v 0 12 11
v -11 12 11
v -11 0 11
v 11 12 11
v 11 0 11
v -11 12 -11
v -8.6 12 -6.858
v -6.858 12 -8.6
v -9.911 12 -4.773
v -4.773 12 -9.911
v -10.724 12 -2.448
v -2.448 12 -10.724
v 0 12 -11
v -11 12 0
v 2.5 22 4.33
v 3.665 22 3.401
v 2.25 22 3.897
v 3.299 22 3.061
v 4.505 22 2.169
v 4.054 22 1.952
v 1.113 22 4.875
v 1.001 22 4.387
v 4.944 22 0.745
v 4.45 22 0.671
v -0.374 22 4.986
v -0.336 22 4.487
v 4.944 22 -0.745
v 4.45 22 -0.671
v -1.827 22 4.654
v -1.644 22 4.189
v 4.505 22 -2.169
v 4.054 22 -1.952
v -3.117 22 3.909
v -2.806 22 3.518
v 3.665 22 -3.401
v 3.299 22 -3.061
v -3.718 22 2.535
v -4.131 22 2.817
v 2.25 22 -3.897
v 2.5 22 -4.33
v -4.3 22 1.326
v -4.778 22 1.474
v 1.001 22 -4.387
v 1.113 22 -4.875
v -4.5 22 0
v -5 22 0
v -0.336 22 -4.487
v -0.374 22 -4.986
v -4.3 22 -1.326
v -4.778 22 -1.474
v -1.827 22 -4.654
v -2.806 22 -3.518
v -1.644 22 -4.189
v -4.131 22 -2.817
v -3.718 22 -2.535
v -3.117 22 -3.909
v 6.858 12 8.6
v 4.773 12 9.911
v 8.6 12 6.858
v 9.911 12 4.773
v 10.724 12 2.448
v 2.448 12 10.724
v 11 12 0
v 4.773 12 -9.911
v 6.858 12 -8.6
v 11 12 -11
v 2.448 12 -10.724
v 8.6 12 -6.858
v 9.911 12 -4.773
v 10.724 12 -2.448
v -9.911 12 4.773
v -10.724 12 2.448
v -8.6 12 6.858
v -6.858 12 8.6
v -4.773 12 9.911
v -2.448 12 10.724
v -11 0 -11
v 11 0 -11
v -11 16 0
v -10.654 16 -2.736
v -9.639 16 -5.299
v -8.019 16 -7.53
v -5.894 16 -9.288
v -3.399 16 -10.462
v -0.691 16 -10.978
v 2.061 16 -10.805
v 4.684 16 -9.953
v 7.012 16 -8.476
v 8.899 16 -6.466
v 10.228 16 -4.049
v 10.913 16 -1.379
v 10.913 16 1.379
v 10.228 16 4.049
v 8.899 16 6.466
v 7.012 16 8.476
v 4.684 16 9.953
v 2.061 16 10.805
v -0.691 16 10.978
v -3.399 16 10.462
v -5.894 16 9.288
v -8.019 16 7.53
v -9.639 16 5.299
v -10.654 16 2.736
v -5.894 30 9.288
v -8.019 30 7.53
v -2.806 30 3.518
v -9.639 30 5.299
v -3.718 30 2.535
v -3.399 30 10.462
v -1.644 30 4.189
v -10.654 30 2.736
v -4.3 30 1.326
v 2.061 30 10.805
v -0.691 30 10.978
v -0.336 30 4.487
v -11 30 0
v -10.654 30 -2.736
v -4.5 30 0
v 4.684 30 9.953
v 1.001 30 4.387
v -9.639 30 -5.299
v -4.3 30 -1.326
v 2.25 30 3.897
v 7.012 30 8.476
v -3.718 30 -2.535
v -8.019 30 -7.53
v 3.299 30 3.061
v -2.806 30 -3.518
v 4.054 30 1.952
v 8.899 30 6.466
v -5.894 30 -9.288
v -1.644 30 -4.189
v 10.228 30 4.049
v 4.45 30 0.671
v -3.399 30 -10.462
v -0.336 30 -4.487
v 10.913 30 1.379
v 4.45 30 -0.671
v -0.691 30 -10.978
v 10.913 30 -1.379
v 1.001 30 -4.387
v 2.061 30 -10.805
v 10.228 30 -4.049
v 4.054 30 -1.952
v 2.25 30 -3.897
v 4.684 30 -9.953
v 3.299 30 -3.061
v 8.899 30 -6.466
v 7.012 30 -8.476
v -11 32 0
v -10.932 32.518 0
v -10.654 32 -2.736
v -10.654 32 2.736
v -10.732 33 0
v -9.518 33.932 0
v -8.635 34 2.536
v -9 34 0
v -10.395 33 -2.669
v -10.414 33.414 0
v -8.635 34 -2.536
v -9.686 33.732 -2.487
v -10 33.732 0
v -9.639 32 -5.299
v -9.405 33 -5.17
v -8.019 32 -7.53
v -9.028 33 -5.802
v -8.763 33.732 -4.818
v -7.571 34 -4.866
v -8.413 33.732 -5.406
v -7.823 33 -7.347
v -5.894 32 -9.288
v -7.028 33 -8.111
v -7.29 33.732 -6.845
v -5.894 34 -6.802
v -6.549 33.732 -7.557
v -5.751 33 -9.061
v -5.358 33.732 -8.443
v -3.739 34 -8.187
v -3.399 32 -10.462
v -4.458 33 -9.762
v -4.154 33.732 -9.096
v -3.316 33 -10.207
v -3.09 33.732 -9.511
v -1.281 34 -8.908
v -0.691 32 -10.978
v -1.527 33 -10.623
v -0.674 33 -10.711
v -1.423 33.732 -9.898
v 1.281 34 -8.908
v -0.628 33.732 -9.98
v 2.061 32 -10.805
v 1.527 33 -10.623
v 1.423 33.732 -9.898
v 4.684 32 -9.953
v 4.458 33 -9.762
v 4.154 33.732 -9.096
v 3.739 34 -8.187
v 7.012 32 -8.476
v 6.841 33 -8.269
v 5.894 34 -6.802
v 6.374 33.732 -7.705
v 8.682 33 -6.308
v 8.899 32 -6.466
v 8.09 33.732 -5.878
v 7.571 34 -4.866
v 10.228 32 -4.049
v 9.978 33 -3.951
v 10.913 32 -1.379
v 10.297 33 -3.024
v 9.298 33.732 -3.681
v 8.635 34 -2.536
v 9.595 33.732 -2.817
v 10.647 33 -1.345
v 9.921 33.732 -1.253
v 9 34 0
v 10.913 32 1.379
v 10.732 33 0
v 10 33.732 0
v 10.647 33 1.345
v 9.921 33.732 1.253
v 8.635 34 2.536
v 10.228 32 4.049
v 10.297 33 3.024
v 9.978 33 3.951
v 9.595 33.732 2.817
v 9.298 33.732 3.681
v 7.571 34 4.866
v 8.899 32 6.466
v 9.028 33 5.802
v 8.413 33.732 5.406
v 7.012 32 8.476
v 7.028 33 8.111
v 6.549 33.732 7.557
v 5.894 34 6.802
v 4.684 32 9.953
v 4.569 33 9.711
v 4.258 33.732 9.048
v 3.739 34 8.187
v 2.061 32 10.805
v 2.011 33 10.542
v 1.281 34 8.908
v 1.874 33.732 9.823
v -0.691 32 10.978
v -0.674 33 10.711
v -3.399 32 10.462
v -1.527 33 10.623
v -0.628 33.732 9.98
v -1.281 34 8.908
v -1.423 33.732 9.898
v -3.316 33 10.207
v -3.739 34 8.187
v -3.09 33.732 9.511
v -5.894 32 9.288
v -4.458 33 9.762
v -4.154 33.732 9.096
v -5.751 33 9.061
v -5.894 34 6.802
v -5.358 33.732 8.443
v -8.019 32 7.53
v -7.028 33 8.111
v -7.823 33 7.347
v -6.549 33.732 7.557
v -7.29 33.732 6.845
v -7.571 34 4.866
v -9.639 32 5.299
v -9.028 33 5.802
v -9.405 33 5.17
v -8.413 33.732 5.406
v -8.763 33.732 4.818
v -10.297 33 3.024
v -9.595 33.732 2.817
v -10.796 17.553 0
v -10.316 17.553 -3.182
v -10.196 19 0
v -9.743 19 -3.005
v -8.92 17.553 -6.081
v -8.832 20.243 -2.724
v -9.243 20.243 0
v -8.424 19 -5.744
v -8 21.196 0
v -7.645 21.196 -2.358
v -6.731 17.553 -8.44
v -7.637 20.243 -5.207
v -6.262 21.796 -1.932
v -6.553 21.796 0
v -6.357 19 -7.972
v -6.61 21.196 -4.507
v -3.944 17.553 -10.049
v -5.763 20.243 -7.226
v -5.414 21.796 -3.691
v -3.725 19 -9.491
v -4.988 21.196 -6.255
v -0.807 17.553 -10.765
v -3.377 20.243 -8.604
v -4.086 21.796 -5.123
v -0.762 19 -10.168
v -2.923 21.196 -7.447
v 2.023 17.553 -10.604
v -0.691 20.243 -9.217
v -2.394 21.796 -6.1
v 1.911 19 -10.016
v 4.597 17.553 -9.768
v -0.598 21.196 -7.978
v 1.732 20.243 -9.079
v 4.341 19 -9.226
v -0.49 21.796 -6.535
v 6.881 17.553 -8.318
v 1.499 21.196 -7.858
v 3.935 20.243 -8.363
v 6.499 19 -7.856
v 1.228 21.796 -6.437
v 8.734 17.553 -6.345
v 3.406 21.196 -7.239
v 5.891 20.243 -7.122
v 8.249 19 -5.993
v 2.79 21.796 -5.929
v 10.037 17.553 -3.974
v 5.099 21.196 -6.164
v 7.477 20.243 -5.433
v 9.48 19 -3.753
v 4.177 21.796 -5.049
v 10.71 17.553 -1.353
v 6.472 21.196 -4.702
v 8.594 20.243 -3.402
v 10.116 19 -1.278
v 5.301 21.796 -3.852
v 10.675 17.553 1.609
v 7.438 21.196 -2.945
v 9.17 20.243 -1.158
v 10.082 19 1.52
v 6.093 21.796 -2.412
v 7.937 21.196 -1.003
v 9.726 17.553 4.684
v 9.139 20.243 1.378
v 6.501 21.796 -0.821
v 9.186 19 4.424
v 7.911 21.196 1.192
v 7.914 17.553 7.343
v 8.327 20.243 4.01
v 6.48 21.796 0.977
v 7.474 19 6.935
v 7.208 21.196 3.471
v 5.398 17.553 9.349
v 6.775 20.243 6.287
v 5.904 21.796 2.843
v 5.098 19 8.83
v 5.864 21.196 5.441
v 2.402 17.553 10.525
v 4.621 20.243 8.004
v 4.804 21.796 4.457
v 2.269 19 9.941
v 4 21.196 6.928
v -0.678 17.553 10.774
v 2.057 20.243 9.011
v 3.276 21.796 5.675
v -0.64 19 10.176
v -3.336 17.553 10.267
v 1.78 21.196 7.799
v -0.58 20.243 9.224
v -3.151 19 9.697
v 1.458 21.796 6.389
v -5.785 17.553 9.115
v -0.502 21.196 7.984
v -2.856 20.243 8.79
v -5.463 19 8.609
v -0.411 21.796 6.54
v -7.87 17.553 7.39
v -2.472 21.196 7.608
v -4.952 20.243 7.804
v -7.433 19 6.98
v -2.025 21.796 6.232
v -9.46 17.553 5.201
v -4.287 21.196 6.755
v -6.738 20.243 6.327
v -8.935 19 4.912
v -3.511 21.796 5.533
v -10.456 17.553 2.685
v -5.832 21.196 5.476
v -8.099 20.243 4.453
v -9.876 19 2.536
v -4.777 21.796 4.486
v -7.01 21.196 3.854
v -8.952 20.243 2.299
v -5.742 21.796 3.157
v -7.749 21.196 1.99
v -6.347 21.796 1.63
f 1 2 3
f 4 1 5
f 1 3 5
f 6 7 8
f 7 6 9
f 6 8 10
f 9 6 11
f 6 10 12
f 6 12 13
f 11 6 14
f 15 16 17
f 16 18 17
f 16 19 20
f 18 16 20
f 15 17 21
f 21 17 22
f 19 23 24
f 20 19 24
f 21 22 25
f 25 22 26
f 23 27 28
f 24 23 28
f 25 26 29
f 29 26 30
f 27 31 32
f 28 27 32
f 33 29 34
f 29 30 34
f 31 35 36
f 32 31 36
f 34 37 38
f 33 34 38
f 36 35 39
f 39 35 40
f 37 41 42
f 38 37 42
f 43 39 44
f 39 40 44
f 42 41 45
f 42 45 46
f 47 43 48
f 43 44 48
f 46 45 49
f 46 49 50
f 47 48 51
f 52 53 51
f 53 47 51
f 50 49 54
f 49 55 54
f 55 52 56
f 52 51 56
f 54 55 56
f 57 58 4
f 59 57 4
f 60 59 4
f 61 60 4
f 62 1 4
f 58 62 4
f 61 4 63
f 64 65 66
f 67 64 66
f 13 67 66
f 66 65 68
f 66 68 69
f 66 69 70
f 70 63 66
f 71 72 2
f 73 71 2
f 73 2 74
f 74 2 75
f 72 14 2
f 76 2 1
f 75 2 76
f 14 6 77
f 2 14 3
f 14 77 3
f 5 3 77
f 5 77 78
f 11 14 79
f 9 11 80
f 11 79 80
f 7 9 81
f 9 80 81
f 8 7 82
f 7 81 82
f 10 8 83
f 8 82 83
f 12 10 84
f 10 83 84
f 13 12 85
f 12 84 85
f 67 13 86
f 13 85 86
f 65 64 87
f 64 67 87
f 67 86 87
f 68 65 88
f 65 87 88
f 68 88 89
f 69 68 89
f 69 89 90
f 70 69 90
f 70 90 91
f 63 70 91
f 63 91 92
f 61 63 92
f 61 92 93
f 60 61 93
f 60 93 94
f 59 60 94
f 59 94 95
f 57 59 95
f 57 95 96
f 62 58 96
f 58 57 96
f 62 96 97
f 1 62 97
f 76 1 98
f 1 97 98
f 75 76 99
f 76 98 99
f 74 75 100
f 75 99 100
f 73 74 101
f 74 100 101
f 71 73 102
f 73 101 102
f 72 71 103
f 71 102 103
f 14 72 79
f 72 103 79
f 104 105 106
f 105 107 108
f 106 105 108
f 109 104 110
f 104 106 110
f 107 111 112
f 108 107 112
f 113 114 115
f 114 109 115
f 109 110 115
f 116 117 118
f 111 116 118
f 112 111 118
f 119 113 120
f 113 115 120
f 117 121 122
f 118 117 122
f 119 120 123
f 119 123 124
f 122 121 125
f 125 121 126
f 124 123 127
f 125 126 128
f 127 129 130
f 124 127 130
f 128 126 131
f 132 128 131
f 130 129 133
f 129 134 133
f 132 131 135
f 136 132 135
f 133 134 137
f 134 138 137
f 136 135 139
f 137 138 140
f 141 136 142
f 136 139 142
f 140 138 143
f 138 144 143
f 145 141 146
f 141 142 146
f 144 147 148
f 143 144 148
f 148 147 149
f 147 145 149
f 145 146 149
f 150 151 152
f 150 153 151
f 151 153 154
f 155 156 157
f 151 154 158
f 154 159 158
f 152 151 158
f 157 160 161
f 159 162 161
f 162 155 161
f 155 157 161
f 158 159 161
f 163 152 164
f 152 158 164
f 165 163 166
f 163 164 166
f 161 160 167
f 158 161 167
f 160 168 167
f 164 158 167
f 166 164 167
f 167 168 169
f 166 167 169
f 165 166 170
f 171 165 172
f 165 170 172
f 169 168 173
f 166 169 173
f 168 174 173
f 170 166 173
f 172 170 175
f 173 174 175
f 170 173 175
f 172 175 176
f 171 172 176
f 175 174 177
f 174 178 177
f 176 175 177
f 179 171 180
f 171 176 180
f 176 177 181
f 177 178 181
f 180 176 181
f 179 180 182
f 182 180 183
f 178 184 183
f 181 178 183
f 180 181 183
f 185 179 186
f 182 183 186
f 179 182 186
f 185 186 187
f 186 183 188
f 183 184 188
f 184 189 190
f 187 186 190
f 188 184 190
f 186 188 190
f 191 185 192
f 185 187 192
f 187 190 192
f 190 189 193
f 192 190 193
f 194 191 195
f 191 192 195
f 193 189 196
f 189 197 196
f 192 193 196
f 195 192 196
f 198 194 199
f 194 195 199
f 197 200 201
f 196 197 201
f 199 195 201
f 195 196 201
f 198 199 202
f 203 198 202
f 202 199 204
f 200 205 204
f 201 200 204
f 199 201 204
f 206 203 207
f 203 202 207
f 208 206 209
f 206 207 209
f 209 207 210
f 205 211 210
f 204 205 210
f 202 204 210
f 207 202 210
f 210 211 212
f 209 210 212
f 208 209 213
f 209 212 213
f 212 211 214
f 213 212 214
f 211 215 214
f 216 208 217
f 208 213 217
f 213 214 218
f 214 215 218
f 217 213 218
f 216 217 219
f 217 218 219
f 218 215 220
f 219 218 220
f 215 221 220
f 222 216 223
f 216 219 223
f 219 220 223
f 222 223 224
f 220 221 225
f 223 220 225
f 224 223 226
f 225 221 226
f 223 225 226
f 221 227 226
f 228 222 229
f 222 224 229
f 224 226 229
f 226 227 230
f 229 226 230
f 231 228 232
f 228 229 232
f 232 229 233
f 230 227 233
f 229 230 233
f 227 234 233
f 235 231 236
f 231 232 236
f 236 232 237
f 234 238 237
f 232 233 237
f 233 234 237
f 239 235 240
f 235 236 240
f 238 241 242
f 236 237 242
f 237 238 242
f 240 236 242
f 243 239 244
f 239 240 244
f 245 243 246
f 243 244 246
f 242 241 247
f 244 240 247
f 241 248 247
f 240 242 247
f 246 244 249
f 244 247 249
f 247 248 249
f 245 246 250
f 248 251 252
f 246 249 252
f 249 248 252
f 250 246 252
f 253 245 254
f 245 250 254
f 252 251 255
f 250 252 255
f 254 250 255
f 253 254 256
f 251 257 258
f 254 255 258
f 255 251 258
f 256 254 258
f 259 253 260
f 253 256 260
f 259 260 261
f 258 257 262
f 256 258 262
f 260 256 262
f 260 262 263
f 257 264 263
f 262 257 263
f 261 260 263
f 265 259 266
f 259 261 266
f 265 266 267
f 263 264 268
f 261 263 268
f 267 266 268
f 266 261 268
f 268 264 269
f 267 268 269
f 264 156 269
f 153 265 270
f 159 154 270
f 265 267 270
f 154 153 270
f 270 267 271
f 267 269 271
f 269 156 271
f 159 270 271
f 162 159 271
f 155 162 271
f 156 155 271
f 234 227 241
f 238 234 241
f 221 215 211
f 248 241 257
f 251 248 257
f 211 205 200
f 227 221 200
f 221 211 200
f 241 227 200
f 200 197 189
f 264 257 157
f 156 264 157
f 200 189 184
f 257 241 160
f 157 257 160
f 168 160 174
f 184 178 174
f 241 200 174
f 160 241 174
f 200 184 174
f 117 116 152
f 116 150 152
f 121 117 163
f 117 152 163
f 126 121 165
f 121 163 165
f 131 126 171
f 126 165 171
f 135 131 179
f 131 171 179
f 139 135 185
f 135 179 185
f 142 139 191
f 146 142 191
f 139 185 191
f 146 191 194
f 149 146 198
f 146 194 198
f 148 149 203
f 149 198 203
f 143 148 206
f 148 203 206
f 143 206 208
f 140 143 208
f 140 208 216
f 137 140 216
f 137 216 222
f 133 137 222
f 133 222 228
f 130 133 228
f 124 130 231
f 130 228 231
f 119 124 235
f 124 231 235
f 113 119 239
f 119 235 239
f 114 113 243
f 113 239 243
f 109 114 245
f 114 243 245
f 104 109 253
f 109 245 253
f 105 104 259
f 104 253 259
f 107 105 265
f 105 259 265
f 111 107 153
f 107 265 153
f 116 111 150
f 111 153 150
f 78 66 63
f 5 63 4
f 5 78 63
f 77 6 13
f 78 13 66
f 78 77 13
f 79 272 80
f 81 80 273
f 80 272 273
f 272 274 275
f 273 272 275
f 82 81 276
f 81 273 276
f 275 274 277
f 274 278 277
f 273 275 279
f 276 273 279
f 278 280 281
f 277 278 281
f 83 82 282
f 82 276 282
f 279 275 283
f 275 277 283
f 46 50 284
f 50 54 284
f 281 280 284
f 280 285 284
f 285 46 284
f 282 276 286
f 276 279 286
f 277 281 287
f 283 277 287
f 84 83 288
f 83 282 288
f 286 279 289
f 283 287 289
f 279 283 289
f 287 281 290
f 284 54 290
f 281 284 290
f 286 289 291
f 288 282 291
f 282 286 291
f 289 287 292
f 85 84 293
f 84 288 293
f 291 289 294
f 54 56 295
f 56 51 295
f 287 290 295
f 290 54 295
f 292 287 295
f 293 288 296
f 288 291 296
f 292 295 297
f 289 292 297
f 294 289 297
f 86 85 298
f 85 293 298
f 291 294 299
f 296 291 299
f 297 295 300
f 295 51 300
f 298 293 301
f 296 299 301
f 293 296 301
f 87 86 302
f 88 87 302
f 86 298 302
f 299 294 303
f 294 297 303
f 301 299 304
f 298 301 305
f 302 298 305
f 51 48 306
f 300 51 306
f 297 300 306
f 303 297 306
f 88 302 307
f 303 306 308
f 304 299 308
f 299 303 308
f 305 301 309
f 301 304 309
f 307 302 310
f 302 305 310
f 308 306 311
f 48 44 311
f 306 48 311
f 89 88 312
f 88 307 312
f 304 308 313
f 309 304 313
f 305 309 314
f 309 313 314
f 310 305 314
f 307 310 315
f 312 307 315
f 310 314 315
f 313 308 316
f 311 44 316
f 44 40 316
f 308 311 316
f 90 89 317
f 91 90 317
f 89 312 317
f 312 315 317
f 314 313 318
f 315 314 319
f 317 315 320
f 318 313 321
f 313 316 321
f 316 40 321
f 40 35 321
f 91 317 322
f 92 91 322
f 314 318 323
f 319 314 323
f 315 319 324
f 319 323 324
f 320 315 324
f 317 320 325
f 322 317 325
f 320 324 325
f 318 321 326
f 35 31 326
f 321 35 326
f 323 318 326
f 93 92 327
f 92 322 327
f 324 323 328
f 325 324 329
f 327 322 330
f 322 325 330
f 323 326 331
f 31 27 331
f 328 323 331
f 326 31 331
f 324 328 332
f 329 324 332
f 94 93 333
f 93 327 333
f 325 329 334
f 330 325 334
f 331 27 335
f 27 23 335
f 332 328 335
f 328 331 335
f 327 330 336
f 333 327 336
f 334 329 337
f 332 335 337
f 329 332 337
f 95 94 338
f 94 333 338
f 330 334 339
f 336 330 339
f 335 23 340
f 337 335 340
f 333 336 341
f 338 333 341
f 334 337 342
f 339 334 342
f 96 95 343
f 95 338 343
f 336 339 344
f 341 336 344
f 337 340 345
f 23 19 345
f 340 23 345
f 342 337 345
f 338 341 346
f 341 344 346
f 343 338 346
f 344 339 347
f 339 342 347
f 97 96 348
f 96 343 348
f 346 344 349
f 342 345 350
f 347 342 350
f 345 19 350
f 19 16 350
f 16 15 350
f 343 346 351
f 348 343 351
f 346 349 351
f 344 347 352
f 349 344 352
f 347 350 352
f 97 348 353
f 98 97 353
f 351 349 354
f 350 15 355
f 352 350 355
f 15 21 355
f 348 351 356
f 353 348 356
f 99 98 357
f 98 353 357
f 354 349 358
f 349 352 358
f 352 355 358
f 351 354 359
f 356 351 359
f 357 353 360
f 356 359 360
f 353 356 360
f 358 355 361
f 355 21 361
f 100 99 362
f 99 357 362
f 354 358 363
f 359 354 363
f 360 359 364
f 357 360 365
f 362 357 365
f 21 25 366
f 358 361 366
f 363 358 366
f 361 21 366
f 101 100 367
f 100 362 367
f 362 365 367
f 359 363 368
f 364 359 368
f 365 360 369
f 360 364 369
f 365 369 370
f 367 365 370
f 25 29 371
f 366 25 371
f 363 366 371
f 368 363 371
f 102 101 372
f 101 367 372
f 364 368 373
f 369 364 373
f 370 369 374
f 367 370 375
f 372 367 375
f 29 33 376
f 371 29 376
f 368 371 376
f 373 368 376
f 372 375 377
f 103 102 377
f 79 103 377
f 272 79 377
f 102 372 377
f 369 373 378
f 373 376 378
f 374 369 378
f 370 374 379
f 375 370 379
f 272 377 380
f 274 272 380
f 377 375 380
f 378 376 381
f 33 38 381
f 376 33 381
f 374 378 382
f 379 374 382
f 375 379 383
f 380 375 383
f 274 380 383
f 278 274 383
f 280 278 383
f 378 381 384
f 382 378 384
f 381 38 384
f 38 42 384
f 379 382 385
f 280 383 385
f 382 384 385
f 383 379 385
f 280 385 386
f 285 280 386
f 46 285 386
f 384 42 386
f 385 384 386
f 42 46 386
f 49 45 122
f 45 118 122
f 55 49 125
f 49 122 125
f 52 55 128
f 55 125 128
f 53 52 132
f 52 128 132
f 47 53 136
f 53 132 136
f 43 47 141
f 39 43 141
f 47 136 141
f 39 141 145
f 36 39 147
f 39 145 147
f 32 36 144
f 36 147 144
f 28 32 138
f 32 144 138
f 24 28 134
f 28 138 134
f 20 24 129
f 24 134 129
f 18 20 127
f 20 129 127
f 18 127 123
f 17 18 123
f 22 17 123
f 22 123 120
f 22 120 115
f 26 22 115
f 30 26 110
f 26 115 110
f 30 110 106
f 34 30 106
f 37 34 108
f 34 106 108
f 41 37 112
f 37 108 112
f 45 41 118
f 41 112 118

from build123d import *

# Parameters (mm, degrees)
SKETCH2_W         = 22
SKETCH2_H         = 22
SWITCH_BASE_DEPTH = 12


with BuildPart() as part:
    # Sketch1 → Stick Revolve (revolve)
    with BuildSketch(Plane.XY):
        with BuildLine():
            Line((0, 0), (-11, 0))
            Line((-11, 0), (-11, 16))
            ThreePointArc((-11, 16), (-9.242640687, 20.242640687), (-5, 22))
            Line((-5, 22), (-4.5, 22))
            Line((-4.5, 22), (-4.5, 30))
            Line((-4.5, 30), (-11, 30))
            Line((-11, 30), (-11, 32))
            ThreePointArc((-11, 32), (-10.414213562, 33.414213562), (-9, 34))
            Line((-9, 34), (0, 34))
            Line((0, 34), (0, 0))
        make_face()
    revolve(axis=Axis((0, 34, 0), (0, -1, 0)))

    # Sketch2 → Switch Base (add)
    with BuildSketch(Plane.XZ):
        Rectangle(SKETCH2_W, SKETCH2_H)
    extrude(amount=-SWITCH_BASE_DEPTH)


solid = part.part
